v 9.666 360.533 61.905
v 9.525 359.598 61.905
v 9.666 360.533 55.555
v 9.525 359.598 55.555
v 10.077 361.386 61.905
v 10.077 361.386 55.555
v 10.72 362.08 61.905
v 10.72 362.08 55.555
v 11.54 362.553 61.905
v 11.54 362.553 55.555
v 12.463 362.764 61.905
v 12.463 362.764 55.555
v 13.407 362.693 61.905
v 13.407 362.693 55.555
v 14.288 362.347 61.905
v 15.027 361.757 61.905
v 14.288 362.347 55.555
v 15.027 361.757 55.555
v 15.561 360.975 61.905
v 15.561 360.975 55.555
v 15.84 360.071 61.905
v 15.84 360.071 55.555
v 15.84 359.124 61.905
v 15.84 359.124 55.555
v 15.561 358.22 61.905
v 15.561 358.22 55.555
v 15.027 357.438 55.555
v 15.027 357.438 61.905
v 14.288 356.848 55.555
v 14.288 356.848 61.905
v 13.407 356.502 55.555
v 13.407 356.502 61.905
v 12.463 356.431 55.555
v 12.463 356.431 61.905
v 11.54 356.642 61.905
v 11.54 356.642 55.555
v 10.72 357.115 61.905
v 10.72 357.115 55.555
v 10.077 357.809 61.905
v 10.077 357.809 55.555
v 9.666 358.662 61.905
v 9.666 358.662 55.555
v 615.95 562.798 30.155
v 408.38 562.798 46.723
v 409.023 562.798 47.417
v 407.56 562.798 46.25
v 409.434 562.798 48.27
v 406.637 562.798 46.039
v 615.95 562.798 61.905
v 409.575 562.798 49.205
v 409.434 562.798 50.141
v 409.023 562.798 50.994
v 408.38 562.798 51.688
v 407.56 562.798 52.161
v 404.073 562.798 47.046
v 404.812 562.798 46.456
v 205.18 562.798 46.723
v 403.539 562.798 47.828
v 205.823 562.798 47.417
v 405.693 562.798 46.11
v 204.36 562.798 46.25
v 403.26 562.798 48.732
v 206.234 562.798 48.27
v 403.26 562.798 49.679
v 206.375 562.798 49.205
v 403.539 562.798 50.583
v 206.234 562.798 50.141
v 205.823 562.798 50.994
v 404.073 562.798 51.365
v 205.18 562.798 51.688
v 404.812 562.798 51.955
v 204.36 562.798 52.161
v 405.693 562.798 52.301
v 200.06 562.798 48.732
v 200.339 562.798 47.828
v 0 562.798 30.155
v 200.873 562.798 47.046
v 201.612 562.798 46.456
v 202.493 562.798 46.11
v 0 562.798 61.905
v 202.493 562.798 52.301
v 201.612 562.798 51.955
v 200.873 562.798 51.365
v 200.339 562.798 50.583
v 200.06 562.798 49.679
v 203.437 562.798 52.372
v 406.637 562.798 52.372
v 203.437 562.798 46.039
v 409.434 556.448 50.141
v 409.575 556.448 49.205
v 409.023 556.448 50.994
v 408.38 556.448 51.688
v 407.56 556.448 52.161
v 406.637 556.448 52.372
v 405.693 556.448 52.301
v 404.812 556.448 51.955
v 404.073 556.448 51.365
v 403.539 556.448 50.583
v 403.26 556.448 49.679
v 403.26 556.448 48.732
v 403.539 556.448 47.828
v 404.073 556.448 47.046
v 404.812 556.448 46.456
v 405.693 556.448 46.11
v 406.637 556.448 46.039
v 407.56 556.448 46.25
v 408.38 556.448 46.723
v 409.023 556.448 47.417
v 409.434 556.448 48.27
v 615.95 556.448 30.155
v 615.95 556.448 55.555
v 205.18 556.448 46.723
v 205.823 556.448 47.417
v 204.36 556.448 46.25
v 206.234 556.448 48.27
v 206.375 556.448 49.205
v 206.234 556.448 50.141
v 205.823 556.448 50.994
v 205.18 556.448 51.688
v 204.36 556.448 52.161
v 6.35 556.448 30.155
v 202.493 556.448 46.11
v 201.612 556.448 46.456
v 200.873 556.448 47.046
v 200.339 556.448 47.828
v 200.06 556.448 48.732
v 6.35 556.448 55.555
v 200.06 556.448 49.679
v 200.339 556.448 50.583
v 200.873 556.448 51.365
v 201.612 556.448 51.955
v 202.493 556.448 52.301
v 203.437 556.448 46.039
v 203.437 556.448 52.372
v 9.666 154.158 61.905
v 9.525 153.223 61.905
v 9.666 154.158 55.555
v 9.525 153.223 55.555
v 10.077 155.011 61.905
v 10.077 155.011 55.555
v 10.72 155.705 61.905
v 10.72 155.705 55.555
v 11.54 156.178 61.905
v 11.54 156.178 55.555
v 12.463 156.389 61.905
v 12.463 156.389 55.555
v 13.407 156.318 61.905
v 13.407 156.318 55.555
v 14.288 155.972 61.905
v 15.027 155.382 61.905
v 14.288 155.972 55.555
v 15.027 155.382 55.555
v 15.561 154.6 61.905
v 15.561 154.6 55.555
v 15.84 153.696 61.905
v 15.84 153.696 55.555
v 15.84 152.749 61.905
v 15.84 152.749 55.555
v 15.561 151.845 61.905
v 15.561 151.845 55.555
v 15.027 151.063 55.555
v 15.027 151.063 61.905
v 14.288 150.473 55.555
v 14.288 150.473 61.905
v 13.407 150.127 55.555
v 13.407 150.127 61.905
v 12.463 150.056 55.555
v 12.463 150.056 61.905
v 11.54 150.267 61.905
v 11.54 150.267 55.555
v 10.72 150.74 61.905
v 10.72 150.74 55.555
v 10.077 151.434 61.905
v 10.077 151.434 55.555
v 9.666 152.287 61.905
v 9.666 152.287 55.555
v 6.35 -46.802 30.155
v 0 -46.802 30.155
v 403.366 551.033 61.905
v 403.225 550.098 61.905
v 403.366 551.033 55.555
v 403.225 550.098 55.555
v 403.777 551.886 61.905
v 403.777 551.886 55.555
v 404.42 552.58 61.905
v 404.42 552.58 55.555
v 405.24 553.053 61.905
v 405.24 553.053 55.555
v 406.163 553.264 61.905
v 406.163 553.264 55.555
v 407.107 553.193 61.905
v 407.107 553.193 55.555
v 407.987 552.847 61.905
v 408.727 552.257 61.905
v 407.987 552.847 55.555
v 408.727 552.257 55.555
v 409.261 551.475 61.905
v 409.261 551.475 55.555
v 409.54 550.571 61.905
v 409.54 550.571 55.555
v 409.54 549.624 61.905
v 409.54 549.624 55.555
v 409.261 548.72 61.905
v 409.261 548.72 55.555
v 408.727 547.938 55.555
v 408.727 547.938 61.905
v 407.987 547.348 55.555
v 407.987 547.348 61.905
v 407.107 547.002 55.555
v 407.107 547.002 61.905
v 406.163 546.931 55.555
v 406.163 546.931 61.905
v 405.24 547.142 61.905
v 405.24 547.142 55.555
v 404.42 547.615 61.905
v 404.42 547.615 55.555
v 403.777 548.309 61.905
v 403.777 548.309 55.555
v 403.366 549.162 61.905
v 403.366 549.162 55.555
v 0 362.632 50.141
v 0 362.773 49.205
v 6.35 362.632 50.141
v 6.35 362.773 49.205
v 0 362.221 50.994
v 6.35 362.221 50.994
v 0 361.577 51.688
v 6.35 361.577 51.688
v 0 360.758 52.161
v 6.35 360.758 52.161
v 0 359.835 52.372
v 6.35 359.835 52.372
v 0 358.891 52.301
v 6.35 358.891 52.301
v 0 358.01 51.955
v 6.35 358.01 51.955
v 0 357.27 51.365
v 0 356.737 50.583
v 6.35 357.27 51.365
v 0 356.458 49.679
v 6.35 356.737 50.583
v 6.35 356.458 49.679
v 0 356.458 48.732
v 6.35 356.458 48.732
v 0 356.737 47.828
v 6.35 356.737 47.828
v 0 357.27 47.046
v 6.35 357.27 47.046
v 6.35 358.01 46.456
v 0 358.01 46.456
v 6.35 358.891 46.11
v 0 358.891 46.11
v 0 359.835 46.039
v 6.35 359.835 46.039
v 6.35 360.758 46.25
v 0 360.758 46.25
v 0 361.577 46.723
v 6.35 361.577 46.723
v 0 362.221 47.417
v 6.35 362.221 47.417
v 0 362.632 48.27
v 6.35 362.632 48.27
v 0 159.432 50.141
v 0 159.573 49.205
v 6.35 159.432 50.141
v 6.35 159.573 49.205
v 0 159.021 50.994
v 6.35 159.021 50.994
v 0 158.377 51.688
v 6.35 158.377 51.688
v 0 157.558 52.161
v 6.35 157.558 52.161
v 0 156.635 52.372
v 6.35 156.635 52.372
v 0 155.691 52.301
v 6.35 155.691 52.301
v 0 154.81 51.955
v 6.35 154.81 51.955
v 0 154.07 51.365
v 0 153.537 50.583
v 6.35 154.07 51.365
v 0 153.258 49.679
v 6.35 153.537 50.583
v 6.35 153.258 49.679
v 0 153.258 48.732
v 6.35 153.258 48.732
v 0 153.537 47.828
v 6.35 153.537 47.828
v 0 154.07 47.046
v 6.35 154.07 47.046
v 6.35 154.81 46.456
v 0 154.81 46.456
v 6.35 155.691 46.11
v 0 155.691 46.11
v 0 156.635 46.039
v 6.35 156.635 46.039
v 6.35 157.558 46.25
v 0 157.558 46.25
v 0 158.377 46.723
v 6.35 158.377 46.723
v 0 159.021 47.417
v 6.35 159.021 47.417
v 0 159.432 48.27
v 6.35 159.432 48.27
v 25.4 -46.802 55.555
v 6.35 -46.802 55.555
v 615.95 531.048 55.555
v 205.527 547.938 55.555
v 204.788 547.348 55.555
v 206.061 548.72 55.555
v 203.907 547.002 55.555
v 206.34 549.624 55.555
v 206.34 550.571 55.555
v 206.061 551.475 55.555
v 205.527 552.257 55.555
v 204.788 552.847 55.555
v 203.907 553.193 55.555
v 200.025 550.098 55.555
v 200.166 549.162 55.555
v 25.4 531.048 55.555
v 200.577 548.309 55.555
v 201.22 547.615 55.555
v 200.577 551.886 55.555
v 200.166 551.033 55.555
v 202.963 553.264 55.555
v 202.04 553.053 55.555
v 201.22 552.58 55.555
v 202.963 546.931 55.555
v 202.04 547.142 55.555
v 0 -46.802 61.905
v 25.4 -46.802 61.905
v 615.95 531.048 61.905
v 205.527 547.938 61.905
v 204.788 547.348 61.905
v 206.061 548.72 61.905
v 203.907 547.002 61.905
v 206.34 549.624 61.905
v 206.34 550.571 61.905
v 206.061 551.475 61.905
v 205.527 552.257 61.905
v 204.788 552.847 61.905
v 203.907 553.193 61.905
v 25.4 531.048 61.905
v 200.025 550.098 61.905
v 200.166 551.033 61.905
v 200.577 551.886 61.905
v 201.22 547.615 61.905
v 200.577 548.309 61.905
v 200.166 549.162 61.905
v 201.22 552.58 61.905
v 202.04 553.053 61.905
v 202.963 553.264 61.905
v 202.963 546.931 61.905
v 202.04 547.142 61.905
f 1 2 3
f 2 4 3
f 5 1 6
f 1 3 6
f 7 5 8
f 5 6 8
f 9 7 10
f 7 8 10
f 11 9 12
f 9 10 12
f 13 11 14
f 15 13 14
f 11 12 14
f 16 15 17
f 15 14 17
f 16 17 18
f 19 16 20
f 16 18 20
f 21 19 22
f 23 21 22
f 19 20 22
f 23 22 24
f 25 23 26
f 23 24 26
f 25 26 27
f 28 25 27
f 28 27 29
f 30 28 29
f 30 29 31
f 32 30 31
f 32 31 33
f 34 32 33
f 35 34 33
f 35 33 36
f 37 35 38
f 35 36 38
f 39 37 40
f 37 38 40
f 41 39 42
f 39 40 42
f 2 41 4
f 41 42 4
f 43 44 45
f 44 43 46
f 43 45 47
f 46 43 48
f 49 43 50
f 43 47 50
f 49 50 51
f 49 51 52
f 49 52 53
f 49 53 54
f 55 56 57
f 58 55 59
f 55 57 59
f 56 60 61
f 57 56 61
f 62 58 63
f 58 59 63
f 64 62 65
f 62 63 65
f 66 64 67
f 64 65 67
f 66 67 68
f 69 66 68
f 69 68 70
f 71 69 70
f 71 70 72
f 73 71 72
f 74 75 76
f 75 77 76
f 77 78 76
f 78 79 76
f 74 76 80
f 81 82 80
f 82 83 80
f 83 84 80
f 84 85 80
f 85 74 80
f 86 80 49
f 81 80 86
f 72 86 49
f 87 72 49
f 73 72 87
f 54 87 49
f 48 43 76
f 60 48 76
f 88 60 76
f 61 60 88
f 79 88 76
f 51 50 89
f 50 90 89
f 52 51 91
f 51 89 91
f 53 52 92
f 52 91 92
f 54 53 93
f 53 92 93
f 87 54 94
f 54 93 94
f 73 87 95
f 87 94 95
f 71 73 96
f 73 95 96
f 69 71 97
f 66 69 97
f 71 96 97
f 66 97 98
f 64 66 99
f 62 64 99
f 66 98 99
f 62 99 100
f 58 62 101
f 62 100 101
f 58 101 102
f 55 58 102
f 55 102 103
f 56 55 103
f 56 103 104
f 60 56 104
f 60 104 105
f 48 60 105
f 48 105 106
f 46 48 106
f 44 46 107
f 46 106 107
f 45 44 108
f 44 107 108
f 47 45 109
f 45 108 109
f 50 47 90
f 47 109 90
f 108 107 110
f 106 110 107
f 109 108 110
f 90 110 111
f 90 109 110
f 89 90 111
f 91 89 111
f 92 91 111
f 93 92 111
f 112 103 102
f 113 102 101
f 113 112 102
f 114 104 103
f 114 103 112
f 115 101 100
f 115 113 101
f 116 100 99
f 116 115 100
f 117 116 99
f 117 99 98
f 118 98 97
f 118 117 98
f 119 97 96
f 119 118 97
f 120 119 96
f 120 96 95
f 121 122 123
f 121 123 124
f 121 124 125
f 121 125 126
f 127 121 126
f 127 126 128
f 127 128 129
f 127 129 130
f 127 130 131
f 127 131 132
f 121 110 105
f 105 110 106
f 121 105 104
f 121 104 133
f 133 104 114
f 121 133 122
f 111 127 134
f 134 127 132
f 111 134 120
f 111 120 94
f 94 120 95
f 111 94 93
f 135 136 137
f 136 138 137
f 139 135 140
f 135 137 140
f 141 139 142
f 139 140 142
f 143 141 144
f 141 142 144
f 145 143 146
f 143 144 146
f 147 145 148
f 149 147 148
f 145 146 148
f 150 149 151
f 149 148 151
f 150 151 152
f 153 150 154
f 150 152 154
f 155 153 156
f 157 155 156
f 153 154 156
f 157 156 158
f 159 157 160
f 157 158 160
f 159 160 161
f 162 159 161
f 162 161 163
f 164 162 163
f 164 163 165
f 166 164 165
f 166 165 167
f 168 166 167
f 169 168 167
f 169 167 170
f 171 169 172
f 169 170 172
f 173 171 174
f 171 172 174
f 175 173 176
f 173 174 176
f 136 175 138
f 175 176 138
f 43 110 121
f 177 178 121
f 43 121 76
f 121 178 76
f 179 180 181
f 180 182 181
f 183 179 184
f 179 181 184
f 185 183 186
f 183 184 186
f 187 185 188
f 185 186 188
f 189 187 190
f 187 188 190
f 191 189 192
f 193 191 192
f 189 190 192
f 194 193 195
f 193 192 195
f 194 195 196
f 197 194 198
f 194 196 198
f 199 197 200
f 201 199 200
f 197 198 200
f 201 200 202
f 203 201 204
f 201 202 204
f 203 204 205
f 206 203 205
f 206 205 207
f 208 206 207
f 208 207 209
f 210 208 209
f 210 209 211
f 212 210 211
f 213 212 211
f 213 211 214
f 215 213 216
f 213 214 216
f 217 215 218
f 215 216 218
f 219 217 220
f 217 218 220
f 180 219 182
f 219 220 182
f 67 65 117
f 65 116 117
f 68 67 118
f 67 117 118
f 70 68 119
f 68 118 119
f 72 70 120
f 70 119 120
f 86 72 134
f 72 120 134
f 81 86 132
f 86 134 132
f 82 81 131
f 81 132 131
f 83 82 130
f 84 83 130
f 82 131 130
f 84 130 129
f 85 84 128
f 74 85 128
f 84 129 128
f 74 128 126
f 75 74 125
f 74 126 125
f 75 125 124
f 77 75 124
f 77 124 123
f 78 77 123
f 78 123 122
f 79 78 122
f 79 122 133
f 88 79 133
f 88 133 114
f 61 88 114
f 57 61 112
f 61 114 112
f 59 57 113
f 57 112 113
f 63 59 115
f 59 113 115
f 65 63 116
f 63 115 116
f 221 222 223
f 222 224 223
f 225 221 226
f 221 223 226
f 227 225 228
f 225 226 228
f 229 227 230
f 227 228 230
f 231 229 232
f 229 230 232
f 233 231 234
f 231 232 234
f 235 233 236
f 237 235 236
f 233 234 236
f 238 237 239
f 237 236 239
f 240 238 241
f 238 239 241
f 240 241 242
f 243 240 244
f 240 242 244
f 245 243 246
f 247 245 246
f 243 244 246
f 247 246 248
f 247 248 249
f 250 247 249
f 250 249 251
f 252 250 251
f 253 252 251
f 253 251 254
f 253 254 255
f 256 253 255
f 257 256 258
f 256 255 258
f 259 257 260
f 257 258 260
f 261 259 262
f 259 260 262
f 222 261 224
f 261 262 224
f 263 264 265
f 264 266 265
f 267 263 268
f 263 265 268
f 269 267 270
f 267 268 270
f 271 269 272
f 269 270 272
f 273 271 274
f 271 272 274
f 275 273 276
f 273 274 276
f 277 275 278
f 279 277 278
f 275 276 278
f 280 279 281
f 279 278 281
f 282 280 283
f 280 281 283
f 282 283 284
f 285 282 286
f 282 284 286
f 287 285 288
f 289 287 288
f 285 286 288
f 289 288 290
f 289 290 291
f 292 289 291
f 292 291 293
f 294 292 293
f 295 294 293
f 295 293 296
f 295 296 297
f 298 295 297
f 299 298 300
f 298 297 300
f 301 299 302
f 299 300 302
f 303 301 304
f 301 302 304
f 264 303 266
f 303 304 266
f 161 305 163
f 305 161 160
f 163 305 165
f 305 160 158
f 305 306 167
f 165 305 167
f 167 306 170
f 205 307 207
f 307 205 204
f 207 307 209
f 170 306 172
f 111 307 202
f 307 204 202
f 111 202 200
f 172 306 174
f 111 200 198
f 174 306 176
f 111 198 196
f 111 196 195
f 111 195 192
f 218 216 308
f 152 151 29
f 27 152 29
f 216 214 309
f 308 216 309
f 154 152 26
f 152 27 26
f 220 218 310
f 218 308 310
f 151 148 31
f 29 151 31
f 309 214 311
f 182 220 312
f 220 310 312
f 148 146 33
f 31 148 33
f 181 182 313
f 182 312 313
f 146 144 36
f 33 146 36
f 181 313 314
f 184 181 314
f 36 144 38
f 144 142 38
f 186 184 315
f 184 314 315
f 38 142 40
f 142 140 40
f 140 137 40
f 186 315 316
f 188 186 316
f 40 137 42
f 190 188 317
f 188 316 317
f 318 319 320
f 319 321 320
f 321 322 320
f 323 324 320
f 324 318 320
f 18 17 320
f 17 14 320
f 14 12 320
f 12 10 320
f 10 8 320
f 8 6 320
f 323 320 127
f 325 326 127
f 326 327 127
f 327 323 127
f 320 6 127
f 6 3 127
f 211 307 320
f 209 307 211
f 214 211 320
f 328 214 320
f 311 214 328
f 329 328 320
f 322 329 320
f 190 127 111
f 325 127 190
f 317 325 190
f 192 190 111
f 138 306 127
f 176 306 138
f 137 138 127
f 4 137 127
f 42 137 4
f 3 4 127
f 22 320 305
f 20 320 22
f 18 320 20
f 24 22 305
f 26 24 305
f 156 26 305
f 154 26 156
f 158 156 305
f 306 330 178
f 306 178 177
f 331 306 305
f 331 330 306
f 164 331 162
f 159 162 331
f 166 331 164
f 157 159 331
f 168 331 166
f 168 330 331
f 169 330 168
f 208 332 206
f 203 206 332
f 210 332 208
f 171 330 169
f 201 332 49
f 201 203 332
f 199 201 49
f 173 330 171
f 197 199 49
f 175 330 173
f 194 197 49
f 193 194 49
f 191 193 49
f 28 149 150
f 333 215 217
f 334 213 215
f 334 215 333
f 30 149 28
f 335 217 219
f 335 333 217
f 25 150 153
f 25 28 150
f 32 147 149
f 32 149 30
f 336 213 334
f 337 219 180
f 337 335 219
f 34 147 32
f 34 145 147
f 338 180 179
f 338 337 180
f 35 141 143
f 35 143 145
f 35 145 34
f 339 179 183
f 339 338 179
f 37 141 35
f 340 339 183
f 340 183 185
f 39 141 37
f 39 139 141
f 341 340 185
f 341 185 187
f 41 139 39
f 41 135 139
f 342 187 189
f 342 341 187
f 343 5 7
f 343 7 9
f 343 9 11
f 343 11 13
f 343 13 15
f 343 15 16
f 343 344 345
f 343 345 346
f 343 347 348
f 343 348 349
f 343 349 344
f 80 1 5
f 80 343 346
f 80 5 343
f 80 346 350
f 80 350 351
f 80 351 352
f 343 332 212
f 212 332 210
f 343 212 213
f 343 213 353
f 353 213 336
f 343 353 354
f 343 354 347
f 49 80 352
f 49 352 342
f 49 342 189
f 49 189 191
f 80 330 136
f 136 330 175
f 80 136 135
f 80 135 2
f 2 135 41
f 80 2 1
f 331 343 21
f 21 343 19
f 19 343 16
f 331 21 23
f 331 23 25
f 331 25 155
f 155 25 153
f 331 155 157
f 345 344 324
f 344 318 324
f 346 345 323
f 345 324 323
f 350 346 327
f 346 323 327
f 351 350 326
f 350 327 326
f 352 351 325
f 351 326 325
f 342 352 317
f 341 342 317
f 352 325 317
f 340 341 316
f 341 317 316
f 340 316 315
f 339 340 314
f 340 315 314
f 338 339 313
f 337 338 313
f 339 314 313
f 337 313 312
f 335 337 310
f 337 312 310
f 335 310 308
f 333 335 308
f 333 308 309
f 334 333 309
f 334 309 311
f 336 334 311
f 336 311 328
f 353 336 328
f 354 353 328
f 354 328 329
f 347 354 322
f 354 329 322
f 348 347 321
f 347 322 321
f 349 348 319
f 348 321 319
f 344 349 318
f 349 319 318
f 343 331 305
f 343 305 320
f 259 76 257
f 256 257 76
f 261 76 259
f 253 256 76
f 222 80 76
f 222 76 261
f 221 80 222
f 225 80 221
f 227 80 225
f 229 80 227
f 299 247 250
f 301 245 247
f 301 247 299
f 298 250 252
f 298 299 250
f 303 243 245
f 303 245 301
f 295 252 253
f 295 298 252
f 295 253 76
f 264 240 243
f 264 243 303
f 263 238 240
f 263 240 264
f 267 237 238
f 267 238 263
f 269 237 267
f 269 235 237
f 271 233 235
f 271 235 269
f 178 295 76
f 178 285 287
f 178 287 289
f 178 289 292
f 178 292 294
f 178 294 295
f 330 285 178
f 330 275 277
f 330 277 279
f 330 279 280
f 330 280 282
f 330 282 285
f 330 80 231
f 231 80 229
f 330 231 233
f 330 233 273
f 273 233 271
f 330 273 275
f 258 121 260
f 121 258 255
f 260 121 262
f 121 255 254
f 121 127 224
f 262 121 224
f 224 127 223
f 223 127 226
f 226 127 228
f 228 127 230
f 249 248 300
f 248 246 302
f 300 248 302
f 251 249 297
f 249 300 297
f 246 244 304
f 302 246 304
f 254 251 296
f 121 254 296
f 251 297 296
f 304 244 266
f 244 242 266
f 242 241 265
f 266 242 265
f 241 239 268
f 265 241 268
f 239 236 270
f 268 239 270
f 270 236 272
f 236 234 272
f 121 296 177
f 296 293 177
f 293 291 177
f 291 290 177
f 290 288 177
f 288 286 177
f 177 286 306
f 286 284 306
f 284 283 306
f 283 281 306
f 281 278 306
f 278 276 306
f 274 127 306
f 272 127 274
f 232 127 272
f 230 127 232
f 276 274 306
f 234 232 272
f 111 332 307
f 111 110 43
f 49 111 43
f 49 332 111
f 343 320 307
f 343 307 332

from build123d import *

# Parameters (mm, degrees)
F0_W             = 609.6
F0_H             = 6.35
F1_DEPTH         = 25.4
F2_W             = 6.35
F2_H             = 609.6
F3_DEPTH         = 25.4
F4_W             = 6.35
F4_H             = 31.75
F5_DEPTH         = 609.6
F6_W             = 25.4
F6_H             = 6.35
F7_DEPTH         = 590.55
F12_D            = 6.35
F12_DEPTH        = 6.35
F12_TIP          = 1.9077324654
F13_D            = 6.35
F13_DEPTH        = 6.35
F13_TIP          = 1.9077324654
F13_ON_F10_D     = 6.35
F13_ON_F10_DEPTH = 6.35
F13_ON_F10_TIP   = 1.9077324654
F13_ON_F9_D      = 6.35
F13_ON_F9_DEPTH  = 6.35
F13_ON_F9_TIP    = 1.9077324654


with BuildPart() as f1:
    # F0 (on Right) → F1 (new body)
    with BuildSketch(Plane.YZ):
        with Locations((257.997608562, 58.7304569781)):
            Rectangle(F0_W, F0_H)
    extrude(amount=F1_DEPTH)

    # F2 (on face) → F3 (join)
    with BuildSketch(Plane(origin=(0, 0, 55.5554569781), x_dir=(1, 0, 0), z_dir=(0, 0, -1))):
        with Locations((3.175, -257.997608562)):
            Rectangle(F2_W, F2_H)
    extrude(amount=F3_DEPTH)

    # F4 (on face) → F5 (join)
    with BuildSketch(Plane.YZ.offset(6.35)):
        with Locations((559.622608562, 46.0304569781)):
            Rectangle(F4_W, F4_H)
    extrude(amount=F5_DEPTH)

    # F6 (on face) → F7 (join)
    with BuildSketch(Plane.YZ.offset(25.4)):
        with Locations((543.747608562, 58.7304569781)):
            Rectangle(F6_W, F6_H)
    extrude(amount=F7_DEPTH)

    # F12
    with Locations(Plane.XY.offset(61.9054569781)):
        with Locations((12.7, 359.597608562), (12.7, 153.222608562)):
            Hole(F12_D / 2, depth=F12_DEPTH)
            with Locations((0, 0, -(F12_DEPTH + F12_TIP / 2))):  # 118° drill point
                Cone(0, F12_D / 2, F12_TIP, mode=Mode.SUBTRACT)

    # F13
    with Locations(Plane(origin=(0, 0, 0), x_dir=(0, -1, 0), z_dir=(-1, 0, 0))):
        with Locations((-359.597608562, 49.2054569781), (-156.397608562, 49.2054569781)):
            Hole(F13_D / 2, depth=F13_DEPTH)
            with Locations((0, 0, -(F13_DEPTH + F13_TIP / 2))):  # 118° drill point
                Cone(0, F13_D / 2, F13_TIP, mode=Mode.SUBTRACT)

    # F13 on F10
    with Locations(Plane(origin=(0, 562.797608562, 0), x_dir=(-1, 0, 0), z_dir=(0, 1, 0))):
        with Locations((-203.2, 49.2054569781), (-406.4, 49.2054569781)):
            Hole(F13_ON_F10_D / 2, depth=F13_ON_F10_DEPTH)
            with Locations((0, 0, -(F13_ON_F10_DEPTH + F13_ON_F10_TIP / 2))):  # 118° drill point
                Cone(0, F13_ON_F10_D / 2, F13_ON_F10_TIP, mode=Mode.SUBTRACT)

    # F13 on F9
    with Locations(Plane.XY.offset(61.9054569781)):
        with Locations((406.4, 550.097608562), (203.2, 550.097608562)):
            Hole(F13_ON_F9_D / 2, depth=F13_ON_F9_DEPTH)
            with Locations((0, 0, -(F13_ON_F9_DEPTH + F13_ON_F9_TIP / 2))):  # 118° drill point
                Cone(0, F13_ON_F9_D / 2, F13_ON_F9_TIP, mode=Mode.SUBTRACT)


solid = f1.part
